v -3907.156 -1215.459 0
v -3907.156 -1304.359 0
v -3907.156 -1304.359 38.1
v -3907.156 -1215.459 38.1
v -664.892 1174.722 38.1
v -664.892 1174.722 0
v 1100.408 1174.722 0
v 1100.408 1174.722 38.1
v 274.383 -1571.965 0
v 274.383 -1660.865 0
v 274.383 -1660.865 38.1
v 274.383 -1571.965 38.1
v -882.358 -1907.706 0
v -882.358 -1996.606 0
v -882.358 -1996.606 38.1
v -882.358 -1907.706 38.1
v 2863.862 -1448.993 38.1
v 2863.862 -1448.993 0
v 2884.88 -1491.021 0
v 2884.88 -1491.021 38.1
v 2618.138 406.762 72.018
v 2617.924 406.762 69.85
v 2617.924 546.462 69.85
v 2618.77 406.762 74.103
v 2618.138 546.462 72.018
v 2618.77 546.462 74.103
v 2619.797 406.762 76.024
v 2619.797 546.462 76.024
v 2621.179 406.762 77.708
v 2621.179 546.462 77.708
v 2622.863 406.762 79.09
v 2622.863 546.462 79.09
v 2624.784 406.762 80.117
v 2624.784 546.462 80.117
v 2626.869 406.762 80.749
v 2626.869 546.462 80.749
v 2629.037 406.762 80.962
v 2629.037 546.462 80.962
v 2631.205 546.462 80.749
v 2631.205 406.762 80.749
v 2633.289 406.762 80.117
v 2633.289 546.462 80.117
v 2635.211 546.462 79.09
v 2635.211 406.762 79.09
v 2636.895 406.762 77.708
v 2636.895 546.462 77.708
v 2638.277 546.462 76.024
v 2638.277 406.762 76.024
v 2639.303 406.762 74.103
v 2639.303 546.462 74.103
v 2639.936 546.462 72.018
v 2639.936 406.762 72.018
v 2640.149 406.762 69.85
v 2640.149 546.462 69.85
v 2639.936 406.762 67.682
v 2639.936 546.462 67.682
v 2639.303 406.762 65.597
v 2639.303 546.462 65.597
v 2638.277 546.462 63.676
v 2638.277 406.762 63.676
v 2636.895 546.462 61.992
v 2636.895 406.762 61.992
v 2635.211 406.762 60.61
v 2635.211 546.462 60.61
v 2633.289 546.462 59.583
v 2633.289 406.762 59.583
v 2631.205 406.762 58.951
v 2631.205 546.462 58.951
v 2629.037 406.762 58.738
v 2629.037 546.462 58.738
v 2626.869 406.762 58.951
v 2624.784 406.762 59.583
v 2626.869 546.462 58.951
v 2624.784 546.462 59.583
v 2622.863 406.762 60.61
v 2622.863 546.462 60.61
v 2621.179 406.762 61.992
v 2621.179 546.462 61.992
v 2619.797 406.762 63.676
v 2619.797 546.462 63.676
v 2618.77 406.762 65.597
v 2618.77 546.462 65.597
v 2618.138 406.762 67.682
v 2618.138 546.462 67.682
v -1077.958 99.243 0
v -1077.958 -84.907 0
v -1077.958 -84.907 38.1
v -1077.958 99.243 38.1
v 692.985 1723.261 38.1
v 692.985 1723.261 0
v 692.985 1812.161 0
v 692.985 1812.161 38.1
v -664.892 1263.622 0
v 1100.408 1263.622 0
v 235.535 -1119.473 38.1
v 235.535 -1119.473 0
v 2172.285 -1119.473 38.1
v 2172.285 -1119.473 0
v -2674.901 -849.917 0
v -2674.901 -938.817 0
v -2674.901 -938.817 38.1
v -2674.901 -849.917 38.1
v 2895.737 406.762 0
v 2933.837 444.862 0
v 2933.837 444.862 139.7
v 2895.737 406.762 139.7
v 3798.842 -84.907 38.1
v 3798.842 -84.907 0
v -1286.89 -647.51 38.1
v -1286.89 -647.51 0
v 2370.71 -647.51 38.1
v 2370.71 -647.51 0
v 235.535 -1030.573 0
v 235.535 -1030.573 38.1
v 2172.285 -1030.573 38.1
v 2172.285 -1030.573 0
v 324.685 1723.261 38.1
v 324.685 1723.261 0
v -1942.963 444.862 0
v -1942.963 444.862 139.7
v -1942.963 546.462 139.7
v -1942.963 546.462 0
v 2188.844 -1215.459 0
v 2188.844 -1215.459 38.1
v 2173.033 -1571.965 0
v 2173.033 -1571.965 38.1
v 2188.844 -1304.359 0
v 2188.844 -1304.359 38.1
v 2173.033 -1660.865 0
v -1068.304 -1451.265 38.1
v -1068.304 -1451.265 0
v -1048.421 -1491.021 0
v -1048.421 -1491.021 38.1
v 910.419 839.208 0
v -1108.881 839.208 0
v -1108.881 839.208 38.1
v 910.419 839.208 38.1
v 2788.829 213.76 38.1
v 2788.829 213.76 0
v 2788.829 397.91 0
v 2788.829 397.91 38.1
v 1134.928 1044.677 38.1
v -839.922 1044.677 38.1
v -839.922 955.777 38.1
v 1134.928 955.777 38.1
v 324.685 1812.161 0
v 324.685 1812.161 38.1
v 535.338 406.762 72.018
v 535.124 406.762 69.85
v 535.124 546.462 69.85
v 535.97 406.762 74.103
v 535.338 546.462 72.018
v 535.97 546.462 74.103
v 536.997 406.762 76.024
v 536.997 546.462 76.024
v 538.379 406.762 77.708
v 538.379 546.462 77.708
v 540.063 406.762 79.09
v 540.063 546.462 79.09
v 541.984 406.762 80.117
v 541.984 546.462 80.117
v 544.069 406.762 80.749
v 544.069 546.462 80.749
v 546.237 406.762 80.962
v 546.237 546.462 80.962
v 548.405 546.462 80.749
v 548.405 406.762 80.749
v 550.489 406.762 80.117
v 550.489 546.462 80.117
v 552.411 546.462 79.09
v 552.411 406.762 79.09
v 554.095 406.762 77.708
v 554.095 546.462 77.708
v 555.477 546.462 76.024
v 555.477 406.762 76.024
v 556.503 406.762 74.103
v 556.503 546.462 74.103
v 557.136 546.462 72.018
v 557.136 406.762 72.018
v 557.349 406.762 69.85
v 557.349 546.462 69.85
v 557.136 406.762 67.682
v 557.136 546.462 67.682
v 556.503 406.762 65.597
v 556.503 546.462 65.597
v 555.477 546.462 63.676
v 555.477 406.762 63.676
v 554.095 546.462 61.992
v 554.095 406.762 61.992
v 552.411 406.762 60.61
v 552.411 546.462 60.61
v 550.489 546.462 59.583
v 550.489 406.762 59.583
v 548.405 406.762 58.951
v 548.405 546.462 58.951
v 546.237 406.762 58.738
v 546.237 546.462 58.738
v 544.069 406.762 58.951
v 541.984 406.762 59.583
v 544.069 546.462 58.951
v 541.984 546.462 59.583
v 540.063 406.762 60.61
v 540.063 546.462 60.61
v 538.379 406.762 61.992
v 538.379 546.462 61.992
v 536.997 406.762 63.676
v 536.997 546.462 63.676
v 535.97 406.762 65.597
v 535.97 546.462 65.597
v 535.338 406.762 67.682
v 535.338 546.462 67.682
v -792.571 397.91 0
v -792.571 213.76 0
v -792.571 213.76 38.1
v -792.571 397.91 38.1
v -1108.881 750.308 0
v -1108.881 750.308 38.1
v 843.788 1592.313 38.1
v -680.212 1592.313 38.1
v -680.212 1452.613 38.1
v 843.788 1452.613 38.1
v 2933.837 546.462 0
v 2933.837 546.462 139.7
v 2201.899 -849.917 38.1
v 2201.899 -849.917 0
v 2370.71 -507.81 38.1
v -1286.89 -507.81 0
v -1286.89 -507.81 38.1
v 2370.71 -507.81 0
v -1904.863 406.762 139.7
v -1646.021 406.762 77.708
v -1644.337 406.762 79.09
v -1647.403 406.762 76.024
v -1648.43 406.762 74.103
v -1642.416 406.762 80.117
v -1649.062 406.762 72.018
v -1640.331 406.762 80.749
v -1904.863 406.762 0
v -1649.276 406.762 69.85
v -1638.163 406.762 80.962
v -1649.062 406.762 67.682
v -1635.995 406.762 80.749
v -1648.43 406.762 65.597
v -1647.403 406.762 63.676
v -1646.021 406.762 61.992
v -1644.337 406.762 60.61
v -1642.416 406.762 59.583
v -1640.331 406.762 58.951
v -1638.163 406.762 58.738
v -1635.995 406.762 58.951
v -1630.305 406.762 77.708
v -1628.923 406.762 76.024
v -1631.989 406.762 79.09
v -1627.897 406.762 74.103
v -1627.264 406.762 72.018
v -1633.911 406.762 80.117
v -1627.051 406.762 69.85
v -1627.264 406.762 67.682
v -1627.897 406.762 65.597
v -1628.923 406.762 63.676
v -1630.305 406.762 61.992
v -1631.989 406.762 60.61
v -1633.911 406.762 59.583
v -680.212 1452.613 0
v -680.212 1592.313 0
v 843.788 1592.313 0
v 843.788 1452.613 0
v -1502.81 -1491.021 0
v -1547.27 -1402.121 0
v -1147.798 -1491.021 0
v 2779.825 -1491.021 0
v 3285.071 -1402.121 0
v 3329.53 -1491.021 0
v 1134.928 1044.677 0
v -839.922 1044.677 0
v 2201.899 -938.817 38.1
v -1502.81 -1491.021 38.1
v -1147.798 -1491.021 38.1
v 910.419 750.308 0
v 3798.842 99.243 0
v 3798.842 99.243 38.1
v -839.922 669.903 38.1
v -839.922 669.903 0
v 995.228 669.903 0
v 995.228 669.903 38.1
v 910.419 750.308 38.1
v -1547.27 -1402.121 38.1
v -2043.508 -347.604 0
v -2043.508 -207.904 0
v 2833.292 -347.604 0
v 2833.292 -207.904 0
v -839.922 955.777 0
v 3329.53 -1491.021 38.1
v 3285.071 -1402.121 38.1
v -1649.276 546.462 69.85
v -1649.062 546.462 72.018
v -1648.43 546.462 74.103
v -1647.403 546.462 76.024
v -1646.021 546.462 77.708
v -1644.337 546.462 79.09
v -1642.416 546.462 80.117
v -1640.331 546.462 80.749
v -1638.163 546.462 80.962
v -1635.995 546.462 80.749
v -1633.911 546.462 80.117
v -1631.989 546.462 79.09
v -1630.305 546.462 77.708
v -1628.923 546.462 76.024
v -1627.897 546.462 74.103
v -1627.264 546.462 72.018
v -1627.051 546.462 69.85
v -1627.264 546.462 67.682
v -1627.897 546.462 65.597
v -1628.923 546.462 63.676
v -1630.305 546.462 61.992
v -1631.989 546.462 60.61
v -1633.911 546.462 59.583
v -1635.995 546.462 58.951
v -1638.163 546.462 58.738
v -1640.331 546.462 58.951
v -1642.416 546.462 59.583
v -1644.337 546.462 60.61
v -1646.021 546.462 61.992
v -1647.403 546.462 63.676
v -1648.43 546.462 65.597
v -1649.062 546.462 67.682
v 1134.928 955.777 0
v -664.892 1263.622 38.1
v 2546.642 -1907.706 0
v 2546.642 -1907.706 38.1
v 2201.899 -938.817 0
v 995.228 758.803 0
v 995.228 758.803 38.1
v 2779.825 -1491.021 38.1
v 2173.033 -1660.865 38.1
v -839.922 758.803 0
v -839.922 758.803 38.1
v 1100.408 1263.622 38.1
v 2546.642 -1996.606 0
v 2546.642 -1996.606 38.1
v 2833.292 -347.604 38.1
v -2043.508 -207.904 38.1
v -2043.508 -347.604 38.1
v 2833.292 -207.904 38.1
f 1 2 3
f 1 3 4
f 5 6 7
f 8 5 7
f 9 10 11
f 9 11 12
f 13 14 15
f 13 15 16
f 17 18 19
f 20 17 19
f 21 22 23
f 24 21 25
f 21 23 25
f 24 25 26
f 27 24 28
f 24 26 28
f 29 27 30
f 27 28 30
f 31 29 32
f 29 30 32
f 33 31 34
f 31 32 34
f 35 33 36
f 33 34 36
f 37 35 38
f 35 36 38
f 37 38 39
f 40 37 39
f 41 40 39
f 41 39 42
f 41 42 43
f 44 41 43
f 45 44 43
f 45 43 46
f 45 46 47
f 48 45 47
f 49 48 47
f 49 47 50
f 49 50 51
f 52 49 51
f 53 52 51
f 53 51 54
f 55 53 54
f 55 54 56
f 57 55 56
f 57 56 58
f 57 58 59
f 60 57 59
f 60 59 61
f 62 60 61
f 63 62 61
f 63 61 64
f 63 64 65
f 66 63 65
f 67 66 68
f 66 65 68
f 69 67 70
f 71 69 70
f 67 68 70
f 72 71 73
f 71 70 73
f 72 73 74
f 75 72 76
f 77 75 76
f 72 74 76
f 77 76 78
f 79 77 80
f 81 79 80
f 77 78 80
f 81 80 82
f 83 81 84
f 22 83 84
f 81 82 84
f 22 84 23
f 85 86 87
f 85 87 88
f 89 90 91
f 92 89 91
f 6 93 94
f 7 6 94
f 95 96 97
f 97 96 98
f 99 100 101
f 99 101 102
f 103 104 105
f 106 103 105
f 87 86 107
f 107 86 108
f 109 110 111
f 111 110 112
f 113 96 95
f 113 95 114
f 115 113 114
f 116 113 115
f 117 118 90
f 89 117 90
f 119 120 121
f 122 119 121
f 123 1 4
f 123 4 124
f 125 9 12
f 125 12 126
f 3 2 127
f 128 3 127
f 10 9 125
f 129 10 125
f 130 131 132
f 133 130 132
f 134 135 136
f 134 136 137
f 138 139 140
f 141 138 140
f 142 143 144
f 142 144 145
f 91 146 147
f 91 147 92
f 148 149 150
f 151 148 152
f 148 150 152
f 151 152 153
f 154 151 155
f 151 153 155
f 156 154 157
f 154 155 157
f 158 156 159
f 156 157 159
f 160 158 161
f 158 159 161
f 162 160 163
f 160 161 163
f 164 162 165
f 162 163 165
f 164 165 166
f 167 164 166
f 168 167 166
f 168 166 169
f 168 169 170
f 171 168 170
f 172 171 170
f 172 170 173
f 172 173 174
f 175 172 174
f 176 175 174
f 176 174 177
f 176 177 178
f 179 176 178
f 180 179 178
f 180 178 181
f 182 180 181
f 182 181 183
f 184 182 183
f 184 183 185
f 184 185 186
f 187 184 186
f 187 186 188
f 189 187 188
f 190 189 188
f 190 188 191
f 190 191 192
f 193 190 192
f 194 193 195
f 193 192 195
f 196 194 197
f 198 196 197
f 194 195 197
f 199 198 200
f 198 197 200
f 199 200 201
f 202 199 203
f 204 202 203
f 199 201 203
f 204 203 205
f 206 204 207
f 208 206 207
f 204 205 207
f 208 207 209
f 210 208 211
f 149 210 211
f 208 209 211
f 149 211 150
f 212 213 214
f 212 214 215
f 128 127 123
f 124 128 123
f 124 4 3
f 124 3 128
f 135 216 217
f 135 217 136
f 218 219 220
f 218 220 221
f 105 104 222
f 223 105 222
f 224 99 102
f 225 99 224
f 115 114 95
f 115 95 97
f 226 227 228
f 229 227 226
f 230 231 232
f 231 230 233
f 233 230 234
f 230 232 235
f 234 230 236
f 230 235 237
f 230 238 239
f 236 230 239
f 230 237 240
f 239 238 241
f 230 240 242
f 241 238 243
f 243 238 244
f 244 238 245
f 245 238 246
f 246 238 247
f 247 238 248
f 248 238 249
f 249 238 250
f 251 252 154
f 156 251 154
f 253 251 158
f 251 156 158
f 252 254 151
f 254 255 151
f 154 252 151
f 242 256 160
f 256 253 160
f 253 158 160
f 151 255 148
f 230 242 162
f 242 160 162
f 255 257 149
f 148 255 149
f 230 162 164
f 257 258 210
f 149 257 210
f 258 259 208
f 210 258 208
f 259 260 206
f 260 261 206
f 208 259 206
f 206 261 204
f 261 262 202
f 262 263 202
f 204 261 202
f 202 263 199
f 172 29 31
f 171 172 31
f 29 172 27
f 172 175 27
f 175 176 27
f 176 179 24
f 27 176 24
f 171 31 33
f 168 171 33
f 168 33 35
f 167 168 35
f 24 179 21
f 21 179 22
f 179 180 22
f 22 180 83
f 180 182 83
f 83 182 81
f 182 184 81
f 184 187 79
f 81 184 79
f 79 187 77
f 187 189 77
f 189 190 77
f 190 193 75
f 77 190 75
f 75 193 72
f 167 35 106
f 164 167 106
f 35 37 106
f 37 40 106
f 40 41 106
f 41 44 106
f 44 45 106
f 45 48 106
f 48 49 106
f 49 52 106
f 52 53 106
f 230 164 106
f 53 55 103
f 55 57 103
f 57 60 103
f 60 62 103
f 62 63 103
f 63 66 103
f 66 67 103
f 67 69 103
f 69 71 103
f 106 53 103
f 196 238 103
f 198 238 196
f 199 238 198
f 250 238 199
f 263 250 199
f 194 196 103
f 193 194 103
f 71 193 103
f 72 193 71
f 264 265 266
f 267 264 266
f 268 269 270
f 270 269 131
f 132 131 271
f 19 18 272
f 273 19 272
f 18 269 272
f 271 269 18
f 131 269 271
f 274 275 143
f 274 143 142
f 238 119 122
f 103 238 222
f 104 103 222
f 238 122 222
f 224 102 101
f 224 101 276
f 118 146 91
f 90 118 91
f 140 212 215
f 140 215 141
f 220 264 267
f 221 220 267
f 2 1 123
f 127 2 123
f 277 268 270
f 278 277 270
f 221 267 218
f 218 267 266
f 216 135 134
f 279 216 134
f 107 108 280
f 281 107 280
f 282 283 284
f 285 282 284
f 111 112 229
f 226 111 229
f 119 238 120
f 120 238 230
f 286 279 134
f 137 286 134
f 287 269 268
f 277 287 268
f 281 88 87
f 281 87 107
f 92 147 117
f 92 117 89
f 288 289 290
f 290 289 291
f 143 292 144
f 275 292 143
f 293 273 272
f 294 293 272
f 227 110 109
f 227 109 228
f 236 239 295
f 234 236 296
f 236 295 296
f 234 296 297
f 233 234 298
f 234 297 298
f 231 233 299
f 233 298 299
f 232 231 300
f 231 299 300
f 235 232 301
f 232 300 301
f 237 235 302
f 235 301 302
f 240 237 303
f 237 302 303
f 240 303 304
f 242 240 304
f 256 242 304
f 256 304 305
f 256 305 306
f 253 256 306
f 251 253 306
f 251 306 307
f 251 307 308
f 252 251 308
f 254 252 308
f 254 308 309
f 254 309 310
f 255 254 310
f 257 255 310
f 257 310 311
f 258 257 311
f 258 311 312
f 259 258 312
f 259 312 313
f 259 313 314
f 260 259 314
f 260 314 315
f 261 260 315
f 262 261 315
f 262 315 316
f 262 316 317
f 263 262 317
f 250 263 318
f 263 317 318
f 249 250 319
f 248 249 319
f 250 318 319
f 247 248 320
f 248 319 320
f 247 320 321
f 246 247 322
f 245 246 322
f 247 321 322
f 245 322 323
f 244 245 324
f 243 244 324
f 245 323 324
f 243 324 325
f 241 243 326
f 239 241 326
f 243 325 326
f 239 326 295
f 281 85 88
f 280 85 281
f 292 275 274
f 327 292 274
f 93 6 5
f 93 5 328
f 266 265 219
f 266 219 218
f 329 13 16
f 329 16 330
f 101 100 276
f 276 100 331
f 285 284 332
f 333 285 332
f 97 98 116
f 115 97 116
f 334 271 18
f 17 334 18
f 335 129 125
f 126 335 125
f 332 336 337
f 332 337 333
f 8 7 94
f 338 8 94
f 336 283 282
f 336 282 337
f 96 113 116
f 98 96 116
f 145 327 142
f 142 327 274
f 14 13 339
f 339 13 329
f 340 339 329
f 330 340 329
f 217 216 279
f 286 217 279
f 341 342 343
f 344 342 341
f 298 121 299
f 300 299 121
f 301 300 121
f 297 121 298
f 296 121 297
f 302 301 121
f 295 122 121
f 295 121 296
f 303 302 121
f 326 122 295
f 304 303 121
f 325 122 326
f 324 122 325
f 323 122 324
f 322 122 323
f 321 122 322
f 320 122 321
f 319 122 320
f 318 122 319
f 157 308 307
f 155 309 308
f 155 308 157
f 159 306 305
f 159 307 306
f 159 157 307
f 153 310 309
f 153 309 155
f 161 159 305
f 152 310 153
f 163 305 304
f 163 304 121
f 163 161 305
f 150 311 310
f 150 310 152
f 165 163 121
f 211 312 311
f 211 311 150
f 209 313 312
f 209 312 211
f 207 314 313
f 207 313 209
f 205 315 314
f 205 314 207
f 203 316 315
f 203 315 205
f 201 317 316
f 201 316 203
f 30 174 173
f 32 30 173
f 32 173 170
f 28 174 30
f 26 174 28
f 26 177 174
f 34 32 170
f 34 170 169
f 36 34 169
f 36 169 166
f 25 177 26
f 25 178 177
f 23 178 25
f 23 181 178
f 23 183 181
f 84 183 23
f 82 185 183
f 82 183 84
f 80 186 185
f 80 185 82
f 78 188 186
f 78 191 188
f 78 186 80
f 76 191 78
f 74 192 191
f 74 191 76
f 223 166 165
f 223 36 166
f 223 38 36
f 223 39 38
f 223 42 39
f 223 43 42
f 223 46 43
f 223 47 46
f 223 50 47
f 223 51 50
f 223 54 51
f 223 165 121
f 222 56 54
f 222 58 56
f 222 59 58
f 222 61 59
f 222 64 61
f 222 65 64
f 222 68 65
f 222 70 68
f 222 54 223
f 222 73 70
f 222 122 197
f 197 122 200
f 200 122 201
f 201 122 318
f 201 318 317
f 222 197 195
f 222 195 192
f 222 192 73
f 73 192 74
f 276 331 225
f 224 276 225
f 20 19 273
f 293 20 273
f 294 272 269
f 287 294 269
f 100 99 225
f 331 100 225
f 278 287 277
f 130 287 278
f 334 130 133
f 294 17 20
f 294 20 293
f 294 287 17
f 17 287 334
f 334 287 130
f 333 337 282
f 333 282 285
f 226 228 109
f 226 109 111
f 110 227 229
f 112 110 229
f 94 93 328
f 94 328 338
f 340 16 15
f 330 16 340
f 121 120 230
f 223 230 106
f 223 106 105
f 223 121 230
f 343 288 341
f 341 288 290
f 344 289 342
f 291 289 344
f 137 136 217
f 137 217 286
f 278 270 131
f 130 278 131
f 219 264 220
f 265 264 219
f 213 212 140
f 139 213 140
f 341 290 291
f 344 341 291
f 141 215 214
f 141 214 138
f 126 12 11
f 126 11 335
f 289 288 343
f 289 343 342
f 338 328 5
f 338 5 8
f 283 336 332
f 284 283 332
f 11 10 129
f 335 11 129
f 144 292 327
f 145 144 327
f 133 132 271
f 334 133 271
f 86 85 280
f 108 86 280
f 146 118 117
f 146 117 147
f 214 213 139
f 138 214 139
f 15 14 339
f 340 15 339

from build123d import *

# Parameters (mm, degrees)
F0_W      = 4876.8
F0_H      = 184.15
F1_DEPTH  = 38.1
F2_W      = 3581.4
F2_H      = 184.15
F3_DEPTH  = 38.1
F4_W      = 4876.8
F4_H      = 139.7
F5_DEPTH  = 139.7
F6_SIZE   = 38.1
F7_W      = 4876.8
F7_H      = 139.7
F8_DEPTH  = 38.1
F9_W      = 3657.6
F9_H      = 139.7
F10_DEPTH = 38.1
F11_W     = 1936.75
F11_H     = 88.9
F12_DEPTH = 38.1
F13_W     = 4876.8
F13_H     = 88.9
F14_DEPTH = 38.1
F15_W     = 6096
F15_H     = 88.9
F16_DEPTH = 38.1
F18_DEPTH = 38.1
F19_W     = 3429
F19_H     = 88.9
F20_DEPTH = 38.1
F21_W     = 1898.65
F21_H     = 88.9
F22_DEPTH = 38.1
F23_W     = 2019.3
F23_H     = 88.9
F24_DEPTH = 38.1
F25_W     = 1974.85
F25_H     = 88.9
F25_W_2   = 1765.3
F25_W_3   = 1524
F25_H_2   = 139.7
F25_W_4   = 1835.15
F25_W_5   = 368.3
F26_DEPTH = 38.1
F27_R     = 11.1125
F28_DEPTH = 2543.069237


with BuildPart() as f1:
    # F0 (on Top) → F1 (new body)
    with BuildSketch(Plane.XY):
        with Locations((1360.442124, 7.167999)):
            Rectangle(F0_W, F0_H)
    extrude(amount=F1_DEPTH)


with BuildPart() as f3:
    # F2 (on Top) → F3 (new body)
    with BuildSketch(Plane.XY):
        with Locations((998.129272, 305.835106)):
            Rectangle(F2_W, F2_H)
    extrude(amount=F3_DEPTH)


with BuildPart() as f5:
    # F4 (on Top) → F5 (new body)
    with BuildSketch(Plane.XY):
        with Locations((495.436847, 476.611887)):
            Rectangle(F4_W, F4_H)
    extrude(amount=F5_DEPTH)

    # F6
    f6_edges = [f5.edges().sort_by_distance(p)[0] for p in [
        (-1942.963153, 406.761887, 69.85),
        (2933.836847, 406.761887, 69.85),
    ]]
    chamfer(f6_edges, length=F6_SIZE)

    # F27 (on face) → F28 (cut, through all)
    with BuildSketch(Plane(origin=(0, 546.461887, 0), x_dir=(-1, 0, 0), z_dir=(0, 1, 0))):
        with Locations((-2629.036847, 69.85)):
            Circle(F27_R)
        with Locations((1638.163153, 69.85)):
            Circle(F27_R)
        with Locations((-546.236847, 69.85)):
            Circle(F27_R)
    extrude(amount=-F28_DEPTH, mode=Mode.SUBTRACT)


with BuildPart() as f8:
    # F7 (on Top) → F8 (new body)
    with BuildSketch(Plane.XY):
        with Locations((394.892484, -277.753947)):
            Rectangle(F7_W, F7_H)
    extrude(amount=F8_DEPTH)


with BuildPart() as f10:
    # F9 (on Top) → F10 (new body)
    with BuildSketch(Plane.XY):
        with Locations((541.910135, -577.659873)):
            Rectangle(F9_W, F9_H)
    extrude(amount=F10_DEPTH)


with BuildPart() as f12:
    # F11 (on Top) → F12 (new body)
    with BuildSketch(Plane.XY):
        with Locations((1203.910346, -1075.023457)):
            Rectangle(F11_W, F11_H)
    extrude(amount=F12_DEPTH)


with BuildPart() as f14:
    # F13 (on Top) → F14 (new body)
    with BuildSketch(Plane.XY):
        with Locations((-236.50071, -894.366667)):
            Rectangle(F13_W, F13_H)
    extrude(amount=F14_DEPTH)


with BuildPart() as f16:
    # F15 (on Top) → F16 (new body)
    with BuildSketch(Plane.XY):
        with Locations((-859.155558, -1259.908959)):
            Rectangle(F15_W, F15_H)
    extrude(amount=F16_DEPTH)


with BuildPart() as f18:
    # F17 (on Top) → F18 (new body)
    with BuildSketch(Plane.XY):
        Polygon((3285.070679, -1402.120701), (-1547.269722, -1402.120701), (-1502.810123, -1491.020701), (-1147.79754, -1491.020701), (-1068.303563, -1451.265129), (-1048.421485, -1491.020701), (2779.825478, -1491.020701), (2863.861968, -1448.993382), (2884.880164, -1491.020701), (3329.530278, -1491.020701), align=None)
    extrude(amount=F18_DEPTH)


with BuildPart() as f20:
    # F19 (on Top) → F20 (new body)
    with BuildSketch(Plane.XY):
        with Locations((832.141827, -1952.15635)):
            Rectangle(F19_W, F19_H)
    extrude(amount=F20_DEPTH)


with BuildPart() as f22:
    # F21 (on Top) → F22 (new body)
    with BuildSketch(Plane.XY):
        with Locations((1223.707788, -1616.41483)):
            Rectangle(F21_W, F21_H)
    extrude(amount=F22_DEPTH)


with BuildPart() as f24:
    # F23 (on Top) → F24 (new body)
    with BuildSketch(Plane.XY):
        with Locations((-99.231235, 794.758394)):
            Rectangle(F23_W, F23_H)
    extrude(amount=F24_DEPTH)


with BuildPart() as f26:
    # F25 (on Top) → F26 (new body)
    with BuildSketch(Plane.XY):
        with Locations((147.503341, 1000.227287)):
            Rectangle(F25_W, F25_H)
        with Locations((217.758067, 1219.171956)):
            Rectangle(F25_W_2, F25_H)
        with Locations((81.788334, 1522.463235)):
            Rectangle(F25_W_3, F25_H_2)
        with Locations((77.653341, 714.353398)):
            Rectangle(F25_W_4, F25_H)
        with Locations((508.835058, 1767.711356)):
            Rectangle(F25_W_5, F25_H)
    extrude(amount=F26_DEPTH)


solid = Compound([f1.part, f3.part, f5.part, f8.part, f10.part, f12.part, f14.part, f16.part, f18.part, f20.part, f22.part, f24.part, f26.part])
